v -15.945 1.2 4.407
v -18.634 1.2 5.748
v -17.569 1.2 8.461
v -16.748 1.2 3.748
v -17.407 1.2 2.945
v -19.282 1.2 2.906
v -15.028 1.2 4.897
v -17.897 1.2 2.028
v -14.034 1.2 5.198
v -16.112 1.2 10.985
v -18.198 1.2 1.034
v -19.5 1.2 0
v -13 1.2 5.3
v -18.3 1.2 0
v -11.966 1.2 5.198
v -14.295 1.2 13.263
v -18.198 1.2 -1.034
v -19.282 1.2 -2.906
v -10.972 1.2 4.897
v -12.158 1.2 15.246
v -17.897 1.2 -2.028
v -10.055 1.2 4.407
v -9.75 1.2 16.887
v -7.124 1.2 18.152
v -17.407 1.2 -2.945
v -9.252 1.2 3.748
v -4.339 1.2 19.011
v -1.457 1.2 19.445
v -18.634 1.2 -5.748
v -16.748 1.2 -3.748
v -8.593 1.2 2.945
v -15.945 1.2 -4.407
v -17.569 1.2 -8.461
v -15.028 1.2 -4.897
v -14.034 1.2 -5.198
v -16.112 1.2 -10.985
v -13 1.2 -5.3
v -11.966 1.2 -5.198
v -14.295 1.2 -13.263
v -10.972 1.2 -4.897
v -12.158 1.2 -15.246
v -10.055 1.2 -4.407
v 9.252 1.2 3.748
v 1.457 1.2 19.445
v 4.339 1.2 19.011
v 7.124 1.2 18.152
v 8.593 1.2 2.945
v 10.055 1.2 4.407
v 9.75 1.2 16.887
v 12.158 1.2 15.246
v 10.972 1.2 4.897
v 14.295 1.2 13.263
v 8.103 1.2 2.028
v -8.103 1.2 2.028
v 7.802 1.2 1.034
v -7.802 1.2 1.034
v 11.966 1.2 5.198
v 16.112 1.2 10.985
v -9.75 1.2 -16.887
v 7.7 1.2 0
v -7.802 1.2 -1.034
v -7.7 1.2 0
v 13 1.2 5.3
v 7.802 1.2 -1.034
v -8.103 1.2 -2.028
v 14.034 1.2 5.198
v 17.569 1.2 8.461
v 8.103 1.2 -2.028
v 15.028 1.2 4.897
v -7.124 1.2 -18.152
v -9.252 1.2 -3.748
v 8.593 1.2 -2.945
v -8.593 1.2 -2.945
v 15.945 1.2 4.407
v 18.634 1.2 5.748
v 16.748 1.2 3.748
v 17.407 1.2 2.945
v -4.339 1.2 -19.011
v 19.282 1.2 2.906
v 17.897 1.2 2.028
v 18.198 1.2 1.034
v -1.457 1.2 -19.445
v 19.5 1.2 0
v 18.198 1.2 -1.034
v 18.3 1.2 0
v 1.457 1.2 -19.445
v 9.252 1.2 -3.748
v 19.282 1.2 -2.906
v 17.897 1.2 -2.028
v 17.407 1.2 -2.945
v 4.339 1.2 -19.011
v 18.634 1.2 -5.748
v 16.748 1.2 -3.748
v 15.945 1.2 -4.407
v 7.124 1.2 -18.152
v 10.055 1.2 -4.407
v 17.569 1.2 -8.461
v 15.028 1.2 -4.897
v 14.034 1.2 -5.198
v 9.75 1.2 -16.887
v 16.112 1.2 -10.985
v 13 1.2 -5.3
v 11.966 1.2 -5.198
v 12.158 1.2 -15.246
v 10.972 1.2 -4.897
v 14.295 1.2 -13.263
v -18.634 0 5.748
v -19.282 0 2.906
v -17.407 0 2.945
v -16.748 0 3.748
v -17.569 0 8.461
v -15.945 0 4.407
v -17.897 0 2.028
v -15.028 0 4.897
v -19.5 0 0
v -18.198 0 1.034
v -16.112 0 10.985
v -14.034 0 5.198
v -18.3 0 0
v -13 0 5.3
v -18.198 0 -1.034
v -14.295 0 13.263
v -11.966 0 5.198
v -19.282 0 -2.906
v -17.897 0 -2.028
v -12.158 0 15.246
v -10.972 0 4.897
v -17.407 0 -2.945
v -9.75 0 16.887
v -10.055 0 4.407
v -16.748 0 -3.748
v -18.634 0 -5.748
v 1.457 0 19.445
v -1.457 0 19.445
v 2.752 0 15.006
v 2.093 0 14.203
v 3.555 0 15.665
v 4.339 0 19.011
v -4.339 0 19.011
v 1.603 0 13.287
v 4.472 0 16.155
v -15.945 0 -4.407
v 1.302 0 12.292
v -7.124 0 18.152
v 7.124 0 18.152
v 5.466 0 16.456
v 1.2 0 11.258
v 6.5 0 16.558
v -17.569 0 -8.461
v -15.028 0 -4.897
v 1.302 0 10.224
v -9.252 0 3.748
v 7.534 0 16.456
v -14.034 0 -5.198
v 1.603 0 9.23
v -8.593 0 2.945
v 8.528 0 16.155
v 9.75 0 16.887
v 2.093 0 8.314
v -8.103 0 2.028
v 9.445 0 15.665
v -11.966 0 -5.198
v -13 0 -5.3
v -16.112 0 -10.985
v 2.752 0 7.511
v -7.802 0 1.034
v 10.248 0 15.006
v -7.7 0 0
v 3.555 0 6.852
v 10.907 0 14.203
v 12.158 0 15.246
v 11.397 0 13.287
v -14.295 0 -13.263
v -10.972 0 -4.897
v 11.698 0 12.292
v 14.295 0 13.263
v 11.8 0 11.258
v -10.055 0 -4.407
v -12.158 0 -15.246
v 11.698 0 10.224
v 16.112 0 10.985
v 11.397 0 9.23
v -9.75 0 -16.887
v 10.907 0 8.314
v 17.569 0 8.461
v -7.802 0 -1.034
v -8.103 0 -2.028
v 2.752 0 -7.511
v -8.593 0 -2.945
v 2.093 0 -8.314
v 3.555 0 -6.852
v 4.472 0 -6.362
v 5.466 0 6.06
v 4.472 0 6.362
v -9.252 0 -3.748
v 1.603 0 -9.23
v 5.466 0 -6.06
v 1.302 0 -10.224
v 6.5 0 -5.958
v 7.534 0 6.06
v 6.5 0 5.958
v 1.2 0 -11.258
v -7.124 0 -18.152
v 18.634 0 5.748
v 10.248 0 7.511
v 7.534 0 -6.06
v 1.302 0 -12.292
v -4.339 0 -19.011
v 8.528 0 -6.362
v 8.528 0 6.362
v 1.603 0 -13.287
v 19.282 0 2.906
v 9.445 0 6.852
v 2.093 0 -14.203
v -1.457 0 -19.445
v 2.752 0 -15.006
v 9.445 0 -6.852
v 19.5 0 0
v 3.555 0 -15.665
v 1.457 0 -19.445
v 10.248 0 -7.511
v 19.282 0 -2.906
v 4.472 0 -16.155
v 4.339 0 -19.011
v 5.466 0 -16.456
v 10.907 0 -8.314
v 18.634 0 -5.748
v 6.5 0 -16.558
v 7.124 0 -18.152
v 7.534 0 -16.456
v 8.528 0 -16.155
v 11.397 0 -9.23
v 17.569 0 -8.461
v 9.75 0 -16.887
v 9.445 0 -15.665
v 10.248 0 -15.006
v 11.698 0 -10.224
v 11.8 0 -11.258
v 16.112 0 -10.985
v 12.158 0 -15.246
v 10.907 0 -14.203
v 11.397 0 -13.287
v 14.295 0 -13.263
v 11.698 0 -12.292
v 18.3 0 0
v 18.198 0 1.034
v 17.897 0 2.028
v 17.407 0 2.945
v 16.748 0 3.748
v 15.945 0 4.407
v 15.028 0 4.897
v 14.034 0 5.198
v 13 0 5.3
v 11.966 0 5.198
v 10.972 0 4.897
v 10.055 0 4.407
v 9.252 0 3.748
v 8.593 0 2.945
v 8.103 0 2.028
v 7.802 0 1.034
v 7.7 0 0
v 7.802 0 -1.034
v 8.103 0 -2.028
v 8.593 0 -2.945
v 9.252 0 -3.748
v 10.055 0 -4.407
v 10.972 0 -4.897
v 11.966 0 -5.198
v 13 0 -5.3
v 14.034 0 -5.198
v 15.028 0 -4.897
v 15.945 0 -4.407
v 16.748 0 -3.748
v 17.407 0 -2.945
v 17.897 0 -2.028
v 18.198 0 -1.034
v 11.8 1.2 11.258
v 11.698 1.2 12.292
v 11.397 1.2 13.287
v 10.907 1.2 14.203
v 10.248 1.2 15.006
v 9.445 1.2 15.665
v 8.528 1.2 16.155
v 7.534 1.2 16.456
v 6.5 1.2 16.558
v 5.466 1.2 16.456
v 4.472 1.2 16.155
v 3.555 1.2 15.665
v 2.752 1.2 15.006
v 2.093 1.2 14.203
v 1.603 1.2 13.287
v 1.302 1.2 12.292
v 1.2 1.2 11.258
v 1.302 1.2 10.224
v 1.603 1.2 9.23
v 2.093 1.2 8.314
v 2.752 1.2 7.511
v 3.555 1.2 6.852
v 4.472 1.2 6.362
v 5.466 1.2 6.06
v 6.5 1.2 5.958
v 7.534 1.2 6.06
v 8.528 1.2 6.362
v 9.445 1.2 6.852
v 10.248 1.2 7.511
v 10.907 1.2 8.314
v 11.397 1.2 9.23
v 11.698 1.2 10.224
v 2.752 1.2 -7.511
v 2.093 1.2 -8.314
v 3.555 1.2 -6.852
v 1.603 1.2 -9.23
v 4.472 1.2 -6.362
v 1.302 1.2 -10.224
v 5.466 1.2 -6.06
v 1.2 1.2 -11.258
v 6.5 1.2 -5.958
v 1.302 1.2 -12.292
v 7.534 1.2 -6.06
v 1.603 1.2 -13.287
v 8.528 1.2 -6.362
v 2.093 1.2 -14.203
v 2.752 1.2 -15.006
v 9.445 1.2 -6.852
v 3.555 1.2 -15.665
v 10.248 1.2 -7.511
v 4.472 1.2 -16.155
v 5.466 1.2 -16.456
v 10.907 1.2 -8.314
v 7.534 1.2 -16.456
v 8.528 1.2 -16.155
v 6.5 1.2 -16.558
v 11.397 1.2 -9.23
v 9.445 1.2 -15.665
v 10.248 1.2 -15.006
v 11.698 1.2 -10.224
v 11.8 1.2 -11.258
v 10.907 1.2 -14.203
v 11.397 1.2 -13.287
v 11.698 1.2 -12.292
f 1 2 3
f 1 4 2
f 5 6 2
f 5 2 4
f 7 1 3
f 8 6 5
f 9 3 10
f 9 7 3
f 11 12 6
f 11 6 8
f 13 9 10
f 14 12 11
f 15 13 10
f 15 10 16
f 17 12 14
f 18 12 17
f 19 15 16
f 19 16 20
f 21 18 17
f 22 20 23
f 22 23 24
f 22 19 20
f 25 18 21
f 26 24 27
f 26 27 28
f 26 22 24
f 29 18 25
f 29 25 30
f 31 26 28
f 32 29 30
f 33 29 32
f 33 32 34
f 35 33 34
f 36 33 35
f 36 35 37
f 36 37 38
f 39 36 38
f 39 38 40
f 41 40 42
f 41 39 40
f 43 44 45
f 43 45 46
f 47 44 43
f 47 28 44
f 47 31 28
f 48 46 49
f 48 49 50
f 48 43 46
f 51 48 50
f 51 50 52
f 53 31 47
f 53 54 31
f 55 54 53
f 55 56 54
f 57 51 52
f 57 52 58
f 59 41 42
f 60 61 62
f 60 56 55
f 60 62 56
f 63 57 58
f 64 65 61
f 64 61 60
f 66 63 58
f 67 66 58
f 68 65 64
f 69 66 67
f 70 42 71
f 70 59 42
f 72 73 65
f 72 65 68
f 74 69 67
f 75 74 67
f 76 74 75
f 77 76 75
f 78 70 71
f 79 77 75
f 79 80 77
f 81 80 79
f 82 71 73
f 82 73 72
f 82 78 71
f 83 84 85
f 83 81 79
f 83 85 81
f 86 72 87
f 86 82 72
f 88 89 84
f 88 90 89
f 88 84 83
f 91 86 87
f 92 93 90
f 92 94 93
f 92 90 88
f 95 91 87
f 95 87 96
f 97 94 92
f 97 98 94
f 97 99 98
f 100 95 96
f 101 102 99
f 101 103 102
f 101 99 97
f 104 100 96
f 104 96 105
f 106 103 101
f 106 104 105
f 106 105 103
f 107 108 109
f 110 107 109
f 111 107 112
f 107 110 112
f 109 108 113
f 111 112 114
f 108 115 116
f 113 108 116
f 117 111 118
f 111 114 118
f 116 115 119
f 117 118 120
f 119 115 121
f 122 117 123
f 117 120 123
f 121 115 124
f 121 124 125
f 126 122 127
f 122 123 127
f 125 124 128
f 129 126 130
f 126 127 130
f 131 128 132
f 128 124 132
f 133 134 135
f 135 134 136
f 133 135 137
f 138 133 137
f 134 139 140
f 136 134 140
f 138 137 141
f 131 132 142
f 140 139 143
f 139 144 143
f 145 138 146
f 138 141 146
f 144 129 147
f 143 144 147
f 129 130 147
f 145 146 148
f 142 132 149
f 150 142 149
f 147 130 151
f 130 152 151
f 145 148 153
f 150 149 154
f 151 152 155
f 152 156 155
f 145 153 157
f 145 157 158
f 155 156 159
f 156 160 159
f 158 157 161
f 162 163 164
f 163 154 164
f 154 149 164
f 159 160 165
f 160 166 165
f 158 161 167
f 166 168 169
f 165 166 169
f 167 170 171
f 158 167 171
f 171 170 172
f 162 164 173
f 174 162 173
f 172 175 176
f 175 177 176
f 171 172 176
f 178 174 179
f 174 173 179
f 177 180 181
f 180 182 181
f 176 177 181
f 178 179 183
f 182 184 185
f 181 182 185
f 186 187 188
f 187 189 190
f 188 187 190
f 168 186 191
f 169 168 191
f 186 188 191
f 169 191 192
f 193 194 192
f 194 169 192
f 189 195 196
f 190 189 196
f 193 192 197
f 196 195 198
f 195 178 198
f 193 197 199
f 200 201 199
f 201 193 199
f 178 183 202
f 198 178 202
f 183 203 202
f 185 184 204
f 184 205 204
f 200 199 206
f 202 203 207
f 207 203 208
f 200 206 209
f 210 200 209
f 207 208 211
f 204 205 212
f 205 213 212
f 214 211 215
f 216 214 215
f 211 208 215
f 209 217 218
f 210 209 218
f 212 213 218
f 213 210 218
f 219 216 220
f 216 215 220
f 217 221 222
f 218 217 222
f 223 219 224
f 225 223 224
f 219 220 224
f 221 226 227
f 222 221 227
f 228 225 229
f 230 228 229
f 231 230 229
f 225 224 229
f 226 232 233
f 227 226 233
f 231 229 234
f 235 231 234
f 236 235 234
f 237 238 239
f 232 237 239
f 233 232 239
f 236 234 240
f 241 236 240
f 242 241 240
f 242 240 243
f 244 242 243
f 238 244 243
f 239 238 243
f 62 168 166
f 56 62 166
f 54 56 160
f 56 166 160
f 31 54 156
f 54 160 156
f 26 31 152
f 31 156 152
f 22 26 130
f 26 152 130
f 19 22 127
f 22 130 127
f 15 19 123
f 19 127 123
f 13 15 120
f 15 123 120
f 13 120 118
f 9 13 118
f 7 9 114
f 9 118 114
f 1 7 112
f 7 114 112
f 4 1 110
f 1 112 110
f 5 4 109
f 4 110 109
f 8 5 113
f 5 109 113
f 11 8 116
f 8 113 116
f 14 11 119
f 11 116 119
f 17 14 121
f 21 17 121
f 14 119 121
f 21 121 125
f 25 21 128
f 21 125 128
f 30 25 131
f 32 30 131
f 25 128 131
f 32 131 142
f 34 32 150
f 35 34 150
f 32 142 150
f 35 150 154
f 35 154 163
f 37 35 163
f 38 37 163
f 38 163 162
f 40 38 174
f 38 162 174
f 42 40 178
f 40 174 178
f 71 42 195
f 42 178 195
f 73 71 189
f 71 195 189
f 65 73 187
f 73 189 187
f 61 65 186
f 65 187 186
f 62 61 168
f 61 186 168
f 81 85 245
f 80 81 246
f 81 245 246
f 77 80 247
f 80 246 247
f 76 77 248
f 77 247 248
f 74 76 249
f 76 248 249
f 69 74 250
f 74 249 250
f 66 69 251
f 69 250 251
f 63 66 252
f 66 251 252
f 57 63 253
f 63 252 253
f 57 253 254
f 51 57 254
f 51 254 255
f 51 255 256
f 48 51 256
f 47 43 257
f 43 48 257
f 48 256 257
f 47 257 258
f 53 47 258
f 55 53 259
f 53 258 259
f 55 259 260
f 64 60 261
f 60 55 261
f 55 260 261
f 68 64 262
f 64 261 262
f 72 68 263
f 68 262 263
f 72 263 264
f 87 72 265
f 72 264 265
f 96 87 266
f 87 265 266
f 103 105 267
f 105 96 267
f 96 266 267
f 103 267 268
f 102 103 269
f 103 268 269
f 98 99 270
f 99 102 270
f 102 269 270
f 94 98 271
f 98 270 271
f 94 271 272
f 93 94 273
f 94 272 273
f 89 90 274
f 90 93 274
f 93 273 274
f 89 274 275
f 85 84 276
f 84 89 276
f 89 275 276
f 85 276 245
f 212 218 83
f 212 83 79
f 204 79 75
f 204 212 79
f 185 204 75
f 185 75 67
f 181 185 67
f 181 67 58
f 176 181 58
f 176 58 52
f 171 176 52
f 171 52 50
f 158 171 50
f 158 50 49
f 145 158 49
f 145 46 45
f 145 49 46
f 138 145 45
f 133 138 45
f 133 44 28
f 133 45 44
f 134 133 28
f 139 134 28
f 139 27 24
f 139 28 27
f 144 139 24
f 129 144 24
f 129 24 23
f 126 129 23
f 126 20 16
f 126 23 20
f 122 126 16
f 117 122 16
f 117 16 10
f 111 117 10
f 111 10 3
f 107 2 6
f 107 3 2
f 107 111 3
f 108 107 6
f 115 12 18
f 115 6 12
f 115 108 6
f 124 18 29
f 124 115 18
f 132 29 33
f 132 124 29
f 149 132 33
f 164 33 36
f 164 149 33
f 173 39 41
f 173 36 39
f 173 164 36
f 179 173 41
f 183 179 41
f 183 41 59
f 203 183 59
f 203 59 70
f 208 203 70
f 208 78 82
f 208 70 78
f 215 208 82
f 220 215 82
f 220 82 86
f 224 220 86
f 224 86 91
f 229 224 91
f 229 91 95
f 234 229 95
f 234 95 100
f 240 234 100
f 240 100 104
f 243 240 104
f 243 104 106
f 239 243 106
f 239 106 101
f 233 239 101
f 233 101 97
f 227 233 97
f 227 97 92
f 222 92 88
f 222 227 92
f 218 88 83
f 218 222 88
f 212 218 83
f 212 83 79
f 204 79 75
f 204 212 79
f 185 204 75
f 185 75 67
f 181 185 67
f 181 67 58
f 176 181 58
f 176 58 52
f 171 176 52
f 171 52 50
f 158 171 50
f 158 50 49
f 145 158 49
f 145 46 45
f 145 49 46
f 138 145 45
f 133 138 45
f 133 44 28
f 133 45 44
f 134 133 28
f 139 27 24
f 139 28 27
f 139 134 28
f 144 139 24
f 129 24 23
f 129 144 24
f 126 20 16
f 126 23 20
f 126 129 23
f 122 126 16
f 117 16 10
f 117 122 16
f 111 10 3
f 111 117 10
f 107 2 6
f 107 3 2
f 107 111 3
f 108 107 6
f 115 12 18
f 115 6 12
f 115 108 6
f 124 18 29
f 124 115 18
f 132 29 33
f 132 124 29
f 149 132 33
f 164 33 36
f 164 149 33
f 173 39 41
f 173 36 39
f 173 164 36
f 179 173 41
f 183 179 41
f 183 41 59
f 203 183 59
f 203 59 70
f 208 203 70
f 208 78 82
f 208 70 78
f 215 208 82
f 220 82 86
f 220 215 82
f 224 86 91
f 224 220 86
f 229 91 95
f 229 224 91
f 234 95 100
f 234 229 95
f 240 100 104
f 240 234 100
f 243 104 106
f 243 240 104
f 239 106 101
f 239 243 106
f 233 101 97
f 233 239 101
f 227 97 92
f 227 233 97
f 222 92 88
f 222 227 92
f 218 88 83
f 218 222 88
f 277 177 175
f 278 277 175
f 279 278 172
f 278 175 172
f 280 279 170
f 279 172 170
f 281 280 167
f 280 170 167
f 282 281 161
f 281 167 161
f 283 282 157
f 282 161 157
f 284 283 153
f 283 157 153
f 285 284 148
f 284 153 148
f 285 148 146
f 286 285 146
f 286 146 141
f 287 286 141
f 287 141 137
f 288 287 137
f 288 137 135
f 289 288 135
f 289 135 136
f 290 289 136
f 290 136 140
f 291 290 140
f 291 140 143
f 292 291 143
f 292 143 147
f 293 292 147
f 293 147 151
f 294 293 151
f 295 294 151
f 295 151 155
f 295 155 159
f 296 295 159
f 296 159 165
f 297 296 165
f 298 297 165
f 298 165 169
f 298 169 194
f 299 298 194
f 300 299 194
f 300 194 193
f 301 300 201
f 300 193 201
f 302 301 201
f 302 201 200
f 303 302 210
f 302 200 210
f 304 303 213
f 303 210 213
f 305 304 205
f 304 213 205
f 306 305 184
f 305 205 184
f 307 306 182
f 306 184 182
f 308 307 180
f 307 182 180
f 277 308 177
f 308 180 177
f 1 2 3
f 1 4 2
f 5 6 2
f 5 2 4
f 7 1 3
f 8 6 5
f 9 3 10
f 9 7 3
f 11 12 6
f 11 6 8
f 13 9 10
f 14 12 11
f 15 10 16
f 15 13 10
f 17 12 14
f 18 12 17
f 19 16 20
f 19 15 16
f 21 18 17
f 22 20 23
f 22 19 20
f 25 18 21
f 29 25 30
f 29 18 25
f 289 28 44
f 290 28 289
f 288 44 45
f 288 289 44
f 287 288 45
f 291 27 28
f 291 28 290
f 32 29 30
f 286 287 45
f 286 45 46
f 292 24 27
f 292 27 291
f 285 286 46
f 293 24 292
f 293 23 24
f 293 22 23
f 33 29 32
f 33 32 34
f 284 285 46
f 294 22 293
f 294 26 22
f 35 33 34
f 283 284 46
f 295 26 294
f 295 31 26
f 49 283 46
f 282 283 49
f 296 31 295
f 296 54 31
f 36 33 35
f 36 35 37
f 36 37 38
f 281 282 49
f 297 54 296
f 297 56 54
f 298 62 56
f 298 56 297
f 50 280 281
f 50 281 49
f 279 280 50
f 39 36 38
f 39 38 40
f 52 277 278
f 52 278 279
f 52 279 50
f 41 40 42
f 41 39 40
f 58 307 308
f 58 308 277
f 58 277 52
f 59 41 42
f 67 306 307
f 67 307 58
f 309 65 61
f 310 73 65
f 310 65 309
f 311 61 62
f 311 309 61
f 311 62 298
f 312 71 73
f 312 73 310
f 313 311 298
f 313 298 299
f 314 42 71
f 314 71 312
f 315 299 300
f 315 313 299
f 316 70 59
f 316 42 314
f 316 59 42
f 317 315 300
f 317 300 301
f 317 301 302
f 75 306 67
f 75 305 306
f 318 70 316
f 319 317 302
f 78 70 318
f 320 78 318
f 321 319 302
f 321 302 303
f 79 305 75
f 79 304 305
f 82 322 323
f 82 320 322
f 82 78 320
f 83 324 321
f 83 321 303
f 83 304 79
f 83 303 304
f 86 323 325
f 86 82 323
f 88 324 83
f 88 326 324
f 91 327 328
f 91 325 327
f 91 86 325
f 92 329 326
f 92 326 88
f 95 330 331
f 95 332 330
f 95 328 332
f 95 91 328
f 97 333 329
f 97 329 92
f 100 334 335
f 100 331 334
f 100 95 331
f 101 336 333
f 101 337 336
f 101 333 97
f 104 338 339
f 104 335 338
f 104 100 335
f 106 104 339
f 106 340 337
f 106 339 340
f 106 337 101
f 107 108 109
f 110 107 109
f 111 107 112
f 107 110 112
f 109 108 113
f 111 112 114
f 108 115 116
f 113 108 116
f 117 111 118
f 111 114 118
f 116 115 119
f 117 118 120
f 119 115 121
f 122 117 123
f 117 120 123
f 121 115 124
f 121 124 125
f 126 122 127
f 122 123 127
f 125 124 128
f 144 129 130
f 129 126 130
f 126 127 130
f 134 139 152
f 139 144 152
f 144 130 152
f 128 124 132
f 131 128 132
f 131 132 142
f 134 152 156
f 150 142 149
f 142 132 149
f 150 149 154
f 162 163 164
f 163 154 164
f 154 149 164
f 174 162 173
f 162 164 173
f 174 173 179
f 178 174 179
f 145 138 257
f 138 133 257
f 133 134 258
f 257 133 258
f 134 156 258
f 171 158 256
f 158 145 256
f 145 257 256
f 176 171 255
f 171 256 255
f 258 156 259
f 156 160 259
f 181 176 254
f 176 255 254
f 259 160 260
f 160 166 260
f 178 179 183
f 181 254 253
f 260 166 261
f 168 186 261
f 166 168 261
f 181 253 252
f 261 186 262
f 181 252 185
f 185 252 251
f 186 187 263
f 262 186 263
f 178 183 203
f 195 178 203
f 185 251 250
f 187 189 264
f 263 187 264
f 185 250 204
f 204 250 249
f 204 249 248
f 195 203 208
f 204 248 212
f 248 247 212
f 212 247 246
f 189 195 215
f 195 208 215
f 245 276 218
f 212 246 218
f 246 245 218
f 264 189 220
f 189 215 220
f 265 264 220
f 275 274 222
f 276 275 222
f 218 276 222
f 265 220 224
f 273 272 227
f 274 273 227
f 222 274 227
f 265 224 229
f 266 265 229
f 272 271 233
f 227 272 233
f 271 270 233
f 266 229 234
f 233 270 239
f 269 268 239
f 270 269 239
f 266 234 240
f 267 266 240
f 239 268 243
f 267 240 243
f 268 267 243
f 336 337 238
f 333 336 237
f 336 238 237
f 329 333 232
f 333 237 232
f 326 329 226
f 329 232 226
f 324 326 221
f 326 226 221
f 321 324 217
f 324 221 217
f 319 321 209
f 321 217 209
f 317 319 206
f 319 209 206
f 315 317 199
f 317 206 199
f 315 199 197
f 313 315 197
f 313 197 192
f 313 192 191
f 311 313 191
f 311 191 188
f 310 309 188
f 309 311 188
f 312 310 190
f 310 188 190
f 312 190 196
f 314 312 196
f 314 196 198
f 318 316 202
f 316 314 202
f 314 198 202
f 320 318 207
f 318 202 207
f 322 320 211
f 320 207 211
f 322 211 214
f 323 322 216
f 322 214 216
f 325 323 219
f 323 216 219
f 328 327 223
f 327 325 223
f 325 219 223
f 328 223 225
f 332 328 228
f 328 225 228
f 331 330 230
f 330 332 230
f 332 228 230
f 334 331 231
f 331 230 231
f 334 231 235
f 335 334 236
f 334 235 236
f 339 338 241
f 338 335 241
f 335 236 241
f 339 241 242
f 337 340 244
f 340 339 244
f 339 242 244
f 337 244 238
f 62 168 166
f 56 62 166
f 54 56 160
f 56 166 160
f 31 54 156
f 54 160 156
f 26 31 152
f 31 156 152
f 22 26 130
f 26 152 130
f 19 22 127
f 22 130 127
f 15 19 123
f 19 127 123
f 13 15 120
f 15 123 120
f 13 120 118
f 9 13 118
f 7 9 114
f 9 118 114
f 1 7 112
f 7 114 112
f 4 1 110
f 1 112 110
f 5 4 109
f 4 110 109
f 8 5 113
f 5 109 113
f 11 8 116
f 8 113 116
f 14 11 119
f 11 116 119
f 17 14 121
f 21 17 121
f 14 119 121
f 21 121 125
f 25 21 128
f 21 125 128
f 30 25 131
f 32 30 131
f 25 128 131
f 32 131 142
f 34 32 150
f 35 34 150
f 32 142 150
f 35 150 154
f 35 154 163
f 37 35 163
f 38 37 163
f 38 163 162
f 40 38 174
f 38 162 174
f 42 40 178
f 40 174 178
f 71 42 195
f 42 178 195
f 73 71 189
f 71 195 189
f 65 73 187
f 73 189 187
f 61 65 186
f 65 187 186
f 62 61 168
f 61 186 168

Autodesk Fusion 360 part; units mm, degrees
sketch "Sketch1" plane through (0, 0, 0) normal (0, 1, 0) x (1, 0, 0)
  circle A0 centre (0, 0) radius 19.5
  circle A1 centre (0, 0) radius 13
  line L0 (-21.8994, 0) -> (35, 0)
  circle A2 centre (-13, 0) radius 5.3
  circle A3 centre (13, 0) radius 5.3
  circle A4 centre (6.5, 11.2583) radius 5.3
  circle A5 centre (6.5, -11.2583) radius 5.3
  dimension "d1" = 39
  dimension "d2" = 26
  dimension "d3" = 10.6
  dimension "d4" = 10.6
  dimension "d7" = 10.6
  dimension "d8" = 10.6
extrude "Extrude1" add sketch "Sketch1" along normal blind 1.2 contours A0 A1 L0 A2 A3 A4 | A0 A1 L0 A2 A3 A5 | A1 L0 A2 A3 A4 | A1 L0 A2 A3 A5 | A1 A4 | A1 A4 | A1 A5 | A1 A5 makes body 1
extrude "Extrude2" add sketch "Sketch1" along normal blind 1.2 separate body contours A0 A1 L0 A2 A3 A4 | A0 A1 L0 A2 A3 A5 | A1 L0 A3 | A1 L0 A3 | A1 L0 A3 | A1 L0 A3 | A1 L0 A2 A3 A4 | A1 L0 A2 A3 A5 makes body 2
